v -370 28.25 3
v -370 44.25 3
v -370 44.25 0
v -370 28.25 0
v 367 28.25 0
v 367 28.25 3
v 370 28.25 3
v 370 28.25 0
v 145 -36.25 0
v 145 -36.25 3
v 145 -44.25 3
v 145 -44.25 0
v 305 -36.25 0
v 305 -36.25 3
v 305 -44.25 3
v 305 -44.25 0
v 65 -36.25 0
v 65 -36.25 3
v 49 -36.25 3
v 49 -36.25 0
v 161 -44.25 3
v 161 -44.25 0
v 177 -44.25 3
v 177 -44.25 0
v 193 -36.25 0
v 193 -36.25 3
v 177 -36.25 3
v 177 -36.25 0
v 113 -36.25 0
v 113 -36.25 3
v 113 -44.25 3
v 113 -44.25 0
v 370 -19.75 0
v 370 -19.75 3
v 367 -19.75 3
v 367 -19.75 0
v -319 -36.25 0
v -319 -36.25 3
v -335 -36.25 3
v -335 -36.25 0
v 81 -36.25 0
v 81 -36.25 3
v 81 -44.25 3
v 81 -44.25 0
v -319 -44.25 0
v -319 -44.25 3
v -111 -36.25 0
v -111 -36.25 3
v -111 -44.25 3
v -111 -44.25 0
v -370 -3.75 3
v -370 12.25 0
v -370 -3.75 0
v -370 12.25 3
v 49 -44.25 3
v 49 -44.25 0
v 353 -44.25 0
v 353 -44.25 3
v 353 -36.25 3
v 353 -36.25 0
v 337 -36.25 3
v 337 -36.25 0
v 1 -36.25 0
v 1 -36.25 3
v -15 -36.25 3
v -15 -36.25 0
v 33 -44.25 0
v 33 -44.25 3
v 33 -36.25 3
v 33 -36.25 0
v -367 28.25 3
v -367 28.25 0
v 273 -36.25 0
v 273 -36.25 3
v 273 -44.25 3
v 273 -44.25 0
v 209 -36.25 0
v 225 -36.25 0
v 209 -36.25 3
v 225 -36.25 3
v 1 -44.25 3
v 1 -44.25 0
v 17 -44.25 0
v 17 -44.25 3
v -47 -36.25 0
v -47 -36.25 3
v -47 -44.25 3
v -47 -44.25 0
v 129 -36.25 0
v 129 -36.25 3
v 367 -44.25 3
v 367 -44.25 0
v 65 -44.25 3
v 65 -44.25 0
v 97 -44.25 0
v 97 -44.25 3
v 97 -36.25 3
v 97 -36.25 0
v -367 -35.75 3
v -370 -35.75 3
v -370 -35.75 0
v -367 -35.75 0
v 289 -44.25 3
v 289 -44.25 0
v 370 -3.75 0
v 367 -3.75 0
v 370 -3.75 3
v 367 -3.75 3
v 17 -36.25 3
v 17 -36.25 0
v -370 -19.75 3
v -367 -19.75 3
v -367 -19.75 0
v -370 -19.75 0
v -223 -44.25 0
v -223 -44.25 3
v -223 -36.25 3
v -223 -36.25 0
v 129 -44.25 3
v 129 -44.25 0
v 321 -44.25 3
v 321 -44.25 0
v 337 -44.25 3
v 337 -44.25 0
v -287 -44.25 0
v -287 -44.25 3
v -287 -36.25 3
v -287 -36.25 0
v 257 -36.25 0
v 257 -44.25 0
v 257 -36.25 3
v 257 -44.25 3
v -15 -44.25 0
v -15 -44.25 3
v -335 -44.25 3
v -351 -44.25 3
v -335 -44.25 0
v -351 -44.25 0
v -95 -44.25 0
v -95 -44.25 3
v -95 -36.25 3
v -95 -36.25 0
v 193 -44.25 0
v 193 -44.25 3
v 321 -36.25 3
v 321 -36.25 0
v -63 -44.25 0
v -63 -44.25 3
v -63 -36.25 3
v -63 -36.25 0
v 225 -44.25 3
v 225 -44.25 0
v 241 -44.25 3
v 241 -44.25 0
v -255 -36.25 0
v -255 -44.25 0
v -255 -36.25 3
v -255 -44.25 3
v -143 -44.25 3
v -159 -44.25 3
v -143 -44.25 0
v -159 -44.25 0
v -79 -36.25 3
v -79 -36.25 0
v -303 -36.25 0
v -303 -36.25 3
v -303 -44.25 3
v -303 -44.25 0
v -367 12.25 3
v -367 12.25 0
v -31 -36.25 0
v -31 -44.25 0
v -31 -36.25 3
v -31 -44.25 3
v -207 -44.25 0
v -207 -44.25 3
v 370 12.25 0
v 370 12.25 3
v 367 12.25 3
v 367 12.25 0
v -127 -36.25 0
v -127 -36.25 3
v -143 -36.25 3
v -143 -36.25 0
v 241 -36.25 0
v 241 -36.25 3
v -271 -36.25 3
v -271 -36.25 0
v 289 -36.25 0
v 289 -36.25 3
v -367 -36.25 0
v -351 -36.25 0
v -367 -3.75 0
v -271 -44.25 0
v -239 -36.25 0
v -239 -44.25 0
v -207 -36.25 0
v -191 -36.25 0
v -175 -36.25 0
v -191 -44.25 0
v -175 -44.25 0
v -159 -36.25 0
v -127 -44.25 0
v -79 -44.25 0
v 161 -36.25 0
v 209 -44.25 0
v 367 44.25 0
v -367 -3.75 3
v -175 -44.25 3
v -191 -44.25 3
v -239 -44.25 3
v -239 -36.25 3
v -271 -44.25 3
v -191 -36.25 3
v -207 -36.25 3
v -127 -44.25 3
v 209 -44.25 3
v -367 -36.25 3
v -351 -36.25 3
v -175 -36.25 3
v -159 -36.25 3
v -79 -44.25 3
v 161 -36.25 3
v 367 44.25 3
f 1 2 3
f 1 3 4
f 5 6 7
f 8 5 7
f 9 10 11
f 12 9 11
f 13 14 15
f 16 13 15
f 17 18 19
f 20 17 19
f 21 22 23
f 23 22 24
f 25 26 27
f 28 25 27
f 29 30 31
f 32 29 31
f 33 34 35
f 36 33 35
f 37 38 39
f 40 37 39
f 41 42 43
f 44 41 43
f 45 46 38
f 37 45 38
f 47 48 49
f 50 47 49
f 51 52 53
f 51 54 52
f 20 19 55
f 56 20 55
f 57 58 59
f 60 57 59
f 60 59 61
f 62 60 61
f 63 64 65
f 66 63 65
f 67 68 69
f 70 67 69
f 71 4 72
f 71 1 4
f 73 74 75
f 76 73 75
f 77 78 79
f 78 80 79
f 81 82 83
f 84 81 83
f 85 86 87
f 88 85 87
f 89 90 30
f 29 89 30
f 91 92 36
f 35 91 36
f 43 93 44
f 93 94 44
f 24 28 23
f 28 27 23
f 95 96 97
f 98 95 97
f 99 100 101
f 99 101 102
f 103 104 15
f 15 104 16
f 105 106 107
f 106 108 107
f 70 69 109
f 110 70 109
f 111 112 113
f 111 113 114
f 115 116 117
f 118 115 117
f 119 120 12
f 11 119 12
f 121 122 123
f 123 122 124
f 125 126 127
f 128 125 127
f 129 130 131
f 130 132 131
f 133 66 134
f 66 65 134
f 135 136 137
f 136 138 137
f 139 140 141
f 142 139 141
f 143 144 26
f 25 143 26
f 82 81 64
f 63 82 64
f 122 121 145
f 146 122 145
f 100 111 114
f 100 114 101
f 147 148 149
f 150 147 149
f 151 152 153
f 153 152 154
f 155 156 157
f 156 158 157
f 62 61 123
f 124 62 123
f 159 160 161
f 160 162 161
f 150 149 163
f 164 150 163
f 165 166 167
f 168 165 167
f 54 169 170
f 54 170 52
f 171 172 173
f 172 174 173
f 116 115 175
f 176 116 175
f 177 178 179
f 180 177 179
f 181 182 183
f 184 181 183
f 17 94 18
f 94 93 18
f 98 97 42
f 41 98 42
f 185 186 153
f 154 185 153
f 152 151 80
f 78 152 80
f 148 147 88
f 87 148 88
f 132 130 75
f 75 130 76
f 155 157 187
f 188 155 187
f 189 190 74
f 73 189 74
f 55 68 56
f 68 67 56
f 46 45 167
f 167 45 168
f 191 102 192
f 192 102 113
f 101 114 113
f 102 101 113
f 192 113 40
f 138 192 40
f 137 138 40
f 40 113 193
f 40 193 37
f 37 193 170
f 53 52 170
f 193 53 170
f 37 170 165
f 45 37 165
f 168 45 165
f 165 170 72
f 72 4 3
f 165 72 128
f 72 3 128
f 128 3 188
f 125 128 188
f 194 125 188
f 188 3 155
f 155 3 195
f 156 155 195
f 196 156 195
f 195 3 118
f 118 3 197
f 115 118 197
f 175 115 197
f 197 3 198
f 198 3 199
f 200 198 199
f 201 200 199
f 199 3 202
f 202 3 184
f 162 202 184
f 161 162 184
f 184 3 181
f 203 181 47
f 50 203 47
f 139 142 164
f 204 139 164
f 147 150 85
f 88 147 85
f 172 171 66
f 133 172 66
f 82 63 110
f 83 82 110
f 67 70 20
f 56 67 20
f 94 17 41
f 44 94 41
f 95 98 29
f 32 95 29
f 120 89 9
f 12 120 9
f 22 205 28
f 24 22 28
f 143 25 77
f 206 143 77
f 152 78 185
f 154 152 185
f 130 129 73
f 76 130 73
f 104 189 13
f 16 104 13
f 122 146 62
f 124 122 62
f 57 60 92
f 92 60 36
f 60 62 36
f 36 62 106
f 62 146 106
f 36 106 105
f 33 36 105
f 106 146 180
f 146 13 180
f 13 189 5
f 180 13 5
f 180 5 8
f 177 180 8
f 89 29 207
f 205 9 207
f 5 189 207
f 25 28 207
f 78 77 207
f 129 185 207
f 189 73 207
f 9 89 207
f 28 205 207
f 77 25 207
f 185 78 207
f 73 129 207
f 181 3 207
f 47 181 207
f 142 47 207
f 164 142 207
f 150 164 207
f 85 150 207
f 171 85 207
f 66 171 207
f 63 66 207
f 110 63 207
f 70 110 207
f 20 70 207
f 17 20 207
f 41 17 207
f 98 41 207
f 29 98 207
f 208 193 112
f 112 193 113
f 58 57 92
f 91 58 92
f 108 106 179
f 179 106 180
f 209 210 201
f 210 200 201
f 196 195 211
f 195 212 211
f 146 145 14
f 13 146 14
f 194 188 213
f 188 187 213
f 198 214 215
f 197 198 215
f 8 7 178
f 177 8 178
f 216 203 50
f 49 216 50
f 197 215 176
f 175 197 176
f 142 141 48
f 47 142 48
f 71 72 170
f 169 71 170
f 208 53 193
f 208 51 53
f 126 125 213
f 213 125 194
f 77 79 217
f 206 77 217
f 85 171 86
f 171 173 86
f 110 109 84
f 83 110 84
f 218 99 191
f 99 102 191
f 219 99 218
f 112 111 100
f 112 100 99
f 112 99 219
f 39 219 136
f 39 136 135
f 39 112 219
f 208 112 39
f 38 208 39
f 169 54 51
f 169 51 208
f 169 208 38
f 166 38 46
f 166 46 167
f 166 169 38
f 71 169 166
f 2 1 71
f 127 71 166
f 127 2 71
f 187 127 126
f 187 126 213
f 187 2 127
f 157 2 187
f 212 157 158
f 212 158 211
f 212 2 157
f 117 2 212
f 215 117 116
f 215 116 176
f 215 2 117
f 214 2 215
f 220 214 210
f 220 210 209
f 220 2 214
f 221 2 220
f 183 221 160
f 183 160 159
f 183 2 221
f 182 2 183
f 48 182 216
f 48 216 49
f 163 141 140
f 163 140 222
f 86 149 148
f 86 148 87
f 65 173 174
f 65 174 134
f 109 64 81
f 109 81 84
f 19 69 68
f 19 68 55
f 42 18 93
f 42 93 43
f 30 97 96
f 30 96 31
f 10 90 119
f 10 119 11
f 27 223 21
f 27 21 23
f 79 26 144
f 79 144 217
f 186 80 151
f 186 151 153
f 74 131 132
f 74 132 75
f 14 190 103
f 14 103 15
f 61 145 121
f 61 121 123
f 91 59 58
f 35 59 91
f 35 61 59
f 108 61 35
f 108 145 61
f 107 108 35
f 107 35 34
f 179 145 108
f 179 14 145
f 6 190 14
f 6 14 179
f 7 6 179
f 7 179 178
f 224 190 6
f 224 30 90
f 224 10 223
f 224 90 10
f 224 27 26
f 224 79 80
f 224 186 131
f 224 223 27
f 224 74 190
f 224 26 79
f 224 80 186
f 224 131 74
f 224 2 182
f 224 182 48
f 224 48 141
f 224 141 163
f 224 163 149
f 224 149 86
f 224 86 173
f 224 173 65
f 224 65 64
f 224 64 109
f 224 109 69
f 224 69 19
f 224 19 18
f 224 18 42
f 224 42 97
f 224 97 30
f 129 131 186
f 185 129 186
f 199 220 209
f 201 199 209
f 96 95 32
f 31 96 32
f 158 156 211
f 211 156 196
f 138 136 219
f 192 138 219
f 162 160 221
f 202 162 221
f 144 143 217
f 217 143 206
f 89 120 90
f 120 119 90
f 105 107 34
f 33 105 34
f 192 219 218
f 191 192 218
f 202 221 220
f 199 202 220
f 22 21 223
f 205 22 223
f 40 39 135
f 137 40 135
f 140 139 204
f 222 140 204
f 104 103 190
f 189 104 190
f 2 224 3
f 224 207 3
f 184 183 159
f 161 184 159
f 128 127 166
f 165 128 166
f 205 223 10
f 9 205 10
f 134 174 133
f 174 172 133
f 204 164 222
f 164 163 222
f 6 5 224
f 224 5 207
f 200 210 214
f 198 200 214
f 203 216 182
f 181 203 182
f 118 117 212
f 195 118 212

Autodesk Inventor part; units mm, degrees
ref_plane "YZ Plane" through (0, 0, 0) normal (1, 0, 0) x (0, 1, 0)
ref_plane "XZ Plane" through (0, 0, 0) normal (0, 1, 0) x (-1, 0, 0)
ref_plane "XY Plane" through (0, 0, 0) normal (0, 0, 1) x (1, 0, 0)
sketch "Эскиз1" plane through (0, 0, 0) normal (0, 0, 1) x (1, 0, 0)
  line L0 (-367, -44.25) -> (367, -44.25)
  line L1 (367, -44.25) -> (367, 44.25)
  line L2 (367, 44.25) -> (-367, 44.25)
  line L3 (-367, 44.25) -> (-367, -44.25)
  line L4 (-367, -44.25) -> (367, 44.25) construction
  line L5 (367, -44.25) -> (-367, 44.25) construction
  point P0 (0, 0)
  dimension "d0" = 734
  dimension "d1" = 88.5
extrude "Выдавливание1" add sketch "Эскиз1" along normal blind 3
sketch "Эскиз2" plane through (0, 0, 3) normal (0, 0, 1) x (1, 0, 0)
  line L0 (-367, -44.25) -> (367, -44.25) projected
  line L1 (-367, -44.25) -> (-351, -44.25)
  line L2 (-351, -44.25) -> (-351, -36.25)
  line L3 (-351, -36.25) -> (-367, -36.25)
  line L4 (-367, -36.25) -> (-367, -44.25)
  line L5 (-335, -44.25) -> (-319, -44.25)
  line L6 (-319, -44.25) -> (-319, -36.25)
  line L7 (-319, -36.25) -> (-335, -36.25)
  line L8 (-335, -36.25) -> (-335, -44.25)
  line L9 (-303, -44.25) -> (-287, -44.25)
  line L10 (-287, -44.25) -> (-287, -36.25)
  line L11 (-287, -36.25) -> (-303, -36.25)
  line L12 (-303, -36.25) -> (-303, -44.25)
  line L13 (-271, -44.25) -> (-255, -44.25)
  line L14 (-255, -44.25) -> (-255, -36.25)
  line L15 (-255, -36.25) -> (-271, -36.25)
  line L16 (-271, -36.25) -> (-271, -44.25)
  line L17 (-239, -44.25) -> (-223, -44.25)
  line L18 (-223, -44.25) -> (-223, -36.25)
  line L19 (-223, -36.25) -> (-239, -36.25)
  line L20 (-239, -36.25) -> (-239, -44.25)
  line L21 (-207, -44.25) -> (-191, -44.25)
  line L22 (-191, -44.25) -> (-191, -36.25)
  line L23 (-191, -36.25) -> (-207, -36.25)
  line L24 (-207, -36.25) -> (-207, -44.25)
  line L25 (-175, -44.25) -> (-159, -44.25)
  line L26 (-159, -44.25) -> (-159, -36.25)
  line L27 (-159, -36.25) -> (-175, -36.25)
  line L28 (-175, -36.25) -> (-175, -44.25)
  line L29 (-143, -44.25) -> (-127, -44.25)
  line L30 (-127, -44.25) -> (-127, -36.25)
  line L31 (-127, -36.25) -> (-143, -36.25)
  line L32 (-143, -36.25) -> (-143, -44.25)
  line L33 (-111, -44.25) -> (-95, -44.25)
  line L34 (-95, -44.25) -> (-95, -36.25)
  line L35 (-95, -36.25) -> (-111, -36.25)
  line L36 (-111, -36.25) -> (-111, -44.25)
  line L37 (-79, -44.25) -> (-63, -44.25)
  line L38 (-63, -44.25) -> (-63, -36.25)
  line L39 (-63, -36.25) -> (-79, -36.25)
  line L40 (-79, -36.25) -> (-79, -44.25)
  line L41 (-47, -44.25) -> (-31, -44.25)
  line L42 (-31, -44.25) -> (-31, -36.25)
  line L43 (-31, -36.25) -> (-47, -36.25)
  line L44 (-47, -36.25) -> (-47, -44.25)
  line L45 (-15, -44.25) -> (1, -44.25)
  line L46 (1, -44.25) -> (1, -36.25)
  line L47 (1, -36.25) -> (-15, -36.25)
  line L48 (-15, -36.25) -> (-15, -44.25)
  line L49 (17, -44.25) -> (33, -44.25)
  line L50 (33, -44.25) -> (33, -36.25)
  line L51 (33, -36.25) -> (17, -36.25)
  line L52 (17, -36.25) -> (17, -44.25)
  line L53 (49, -44.25) -> (65, -44.25)
  line L54 (65, -44.25) -> (65, -36.25)
  line L55 (65, -36.25) -> (49, -36.25)
  line L56 (49, -36.25) -> (49, -44.25)
  line L57 (81, -44.25) -> (97, -44.25)
  line L58 (97, -44.25) -> (97, -36.25)
  line L59 (97, -36.25) -> (81, -36.25)
  line L60 (81, -36.25) -> (81, -44.25)
  line L61 (113, -44.25) -> (129, -44.25)
  line L62 (129, -44.25) -> (129, -36.25)
  line L63 (129, -36.25) -> (113, -36.25)
  line L64 (113, -36.25) -> (113, -44.25)
  line L65 (145, -44.25) -> (161, -44.25)
  line L66 (161, -44.25) -> (161, -36.25)
  line L67 (161, -36.25) -> (145, -36.25)
  line L68 (145, -36.25) -> (145, -44.25)
  line L69 (177, -44.25) -> (193, -44.25)
  line L70 (193, -44.25) -> (193, -36.25)
  line L71 (193, -36.25) -> (177, -36.25)
  line L72 (177, -36.25) -> (177, -44.25)
  line L73 (209, -44.25) -> (225, -44.25)
  line L74 (225, -44.25) -> (225, -36.25)
  line L75 (225, -36.25) -> (209, -36.25)
  line L76 (209, -36.25) -> (209, -44.25)
  line L77 (241, -44.25) -> (257, -44.25)
  line L78 (257, -44.25) -> (257, -36.25)
  line L79 (257, -36.25) -> (241, -36.25)
  line L80 (241, -36.25) -> (241, -44.25)
  line L81 (273, -44.25) -> (289, -44.25)
  line L82 (289, -44.25) -> (289, -36.25)
  line L83 (289, -36.25) -> (273, -36.25)
  line L84 (273, -36.25) -> (273, -44.25)
  line L85 (305, -44.25) -> (321, -44.25)
  line L86 (321, -44.25) -> (321, -36.25)
  line L87 (321, -36.25) -> (305, -36.25)
  line L88 (305, -36.25) -> (305, -44.25)
  line L89 (337, -44.25) -> (353, -44.25)
  line L90 (353, -44.25) -> (353, -36.25)
  line L91 (353, -36.25) -> (337, -36.25)
  line L92 (337, -36.25) -> (337, -44.25)
  point P0 (0, 0)
  dimension "d4" = 16
  dimension "d5" = 8
  dimension "d8" = 32
extrude "Выдавливание2" cut sketch "Эскиз2" against normal blind 3
sketch "Эскиз3" plane through (0, 0, 3) normal (0, 0, 1) x (1, 0, 0)
  line L0 (367, 44.25) -> (-367, 44.25) projected
  line L1 (-367, 44.25) -> (-370, 44.25)
  line L2 (-370, 44.25) -> (-370, 28.25)
  line L3 (-370, 28.25) -> (-367, 28.25)
  line L4 (-367, 28.25) -> (-367, 44.25)
  line L5 (-367, 12.25) -> (-370, 12.25)
  line L6 (-370, 12.25) -> (-370, -3.75)
  line L7 (-370, -3.75) -> (-367, -3.75)
  line L8 (-367, -3.75) -> (-367, 12.25)
  line L9 (-367, -19.75) -> (-370, -19.75)
  line L10 (-370, -19.75) -> (-370, -35.75)
  line L11 (-370, -35.75) -> (-367, -35.75)
  line L12 (-367, -35.75) -> (-367, -19.75)
  line L13 (367, -44.25) -> (367, 44.25) projected
  line L14 (367, 28.25) -> (367, 44.25)
  line L15 (367, 28.25) -> (370, 28.25)
  line L16 (370, 28.25) -> (370, 12.25)
  line L17 (370, 12.25) -> (367, 12.25)
  line L18 (367, 12.25) -> (367, 28.25)
  line L19 (370, -19.75) -> (367, -19.75)
  line L20 (370, -3.75) -> (370, -19.75)
  line L21 (367, -3.75) -> (370, -3.75)
  line L22 (367, -19.75) -> (367, -3.75)
  point P0 (0, 0)
  dimension "d15" = 3
  dimension "d16" = 16
  dimension "d19" = 32
  dimension "d24" = 3
  dimension "d25" = 16
  dimension "d28" = 32
extrude "Выдавливание3" add sketch "Эскиз3" against normal blind 3
properties part number "КВ33.044.004 - Стенка блока управления" material "Дерево (береза)"
